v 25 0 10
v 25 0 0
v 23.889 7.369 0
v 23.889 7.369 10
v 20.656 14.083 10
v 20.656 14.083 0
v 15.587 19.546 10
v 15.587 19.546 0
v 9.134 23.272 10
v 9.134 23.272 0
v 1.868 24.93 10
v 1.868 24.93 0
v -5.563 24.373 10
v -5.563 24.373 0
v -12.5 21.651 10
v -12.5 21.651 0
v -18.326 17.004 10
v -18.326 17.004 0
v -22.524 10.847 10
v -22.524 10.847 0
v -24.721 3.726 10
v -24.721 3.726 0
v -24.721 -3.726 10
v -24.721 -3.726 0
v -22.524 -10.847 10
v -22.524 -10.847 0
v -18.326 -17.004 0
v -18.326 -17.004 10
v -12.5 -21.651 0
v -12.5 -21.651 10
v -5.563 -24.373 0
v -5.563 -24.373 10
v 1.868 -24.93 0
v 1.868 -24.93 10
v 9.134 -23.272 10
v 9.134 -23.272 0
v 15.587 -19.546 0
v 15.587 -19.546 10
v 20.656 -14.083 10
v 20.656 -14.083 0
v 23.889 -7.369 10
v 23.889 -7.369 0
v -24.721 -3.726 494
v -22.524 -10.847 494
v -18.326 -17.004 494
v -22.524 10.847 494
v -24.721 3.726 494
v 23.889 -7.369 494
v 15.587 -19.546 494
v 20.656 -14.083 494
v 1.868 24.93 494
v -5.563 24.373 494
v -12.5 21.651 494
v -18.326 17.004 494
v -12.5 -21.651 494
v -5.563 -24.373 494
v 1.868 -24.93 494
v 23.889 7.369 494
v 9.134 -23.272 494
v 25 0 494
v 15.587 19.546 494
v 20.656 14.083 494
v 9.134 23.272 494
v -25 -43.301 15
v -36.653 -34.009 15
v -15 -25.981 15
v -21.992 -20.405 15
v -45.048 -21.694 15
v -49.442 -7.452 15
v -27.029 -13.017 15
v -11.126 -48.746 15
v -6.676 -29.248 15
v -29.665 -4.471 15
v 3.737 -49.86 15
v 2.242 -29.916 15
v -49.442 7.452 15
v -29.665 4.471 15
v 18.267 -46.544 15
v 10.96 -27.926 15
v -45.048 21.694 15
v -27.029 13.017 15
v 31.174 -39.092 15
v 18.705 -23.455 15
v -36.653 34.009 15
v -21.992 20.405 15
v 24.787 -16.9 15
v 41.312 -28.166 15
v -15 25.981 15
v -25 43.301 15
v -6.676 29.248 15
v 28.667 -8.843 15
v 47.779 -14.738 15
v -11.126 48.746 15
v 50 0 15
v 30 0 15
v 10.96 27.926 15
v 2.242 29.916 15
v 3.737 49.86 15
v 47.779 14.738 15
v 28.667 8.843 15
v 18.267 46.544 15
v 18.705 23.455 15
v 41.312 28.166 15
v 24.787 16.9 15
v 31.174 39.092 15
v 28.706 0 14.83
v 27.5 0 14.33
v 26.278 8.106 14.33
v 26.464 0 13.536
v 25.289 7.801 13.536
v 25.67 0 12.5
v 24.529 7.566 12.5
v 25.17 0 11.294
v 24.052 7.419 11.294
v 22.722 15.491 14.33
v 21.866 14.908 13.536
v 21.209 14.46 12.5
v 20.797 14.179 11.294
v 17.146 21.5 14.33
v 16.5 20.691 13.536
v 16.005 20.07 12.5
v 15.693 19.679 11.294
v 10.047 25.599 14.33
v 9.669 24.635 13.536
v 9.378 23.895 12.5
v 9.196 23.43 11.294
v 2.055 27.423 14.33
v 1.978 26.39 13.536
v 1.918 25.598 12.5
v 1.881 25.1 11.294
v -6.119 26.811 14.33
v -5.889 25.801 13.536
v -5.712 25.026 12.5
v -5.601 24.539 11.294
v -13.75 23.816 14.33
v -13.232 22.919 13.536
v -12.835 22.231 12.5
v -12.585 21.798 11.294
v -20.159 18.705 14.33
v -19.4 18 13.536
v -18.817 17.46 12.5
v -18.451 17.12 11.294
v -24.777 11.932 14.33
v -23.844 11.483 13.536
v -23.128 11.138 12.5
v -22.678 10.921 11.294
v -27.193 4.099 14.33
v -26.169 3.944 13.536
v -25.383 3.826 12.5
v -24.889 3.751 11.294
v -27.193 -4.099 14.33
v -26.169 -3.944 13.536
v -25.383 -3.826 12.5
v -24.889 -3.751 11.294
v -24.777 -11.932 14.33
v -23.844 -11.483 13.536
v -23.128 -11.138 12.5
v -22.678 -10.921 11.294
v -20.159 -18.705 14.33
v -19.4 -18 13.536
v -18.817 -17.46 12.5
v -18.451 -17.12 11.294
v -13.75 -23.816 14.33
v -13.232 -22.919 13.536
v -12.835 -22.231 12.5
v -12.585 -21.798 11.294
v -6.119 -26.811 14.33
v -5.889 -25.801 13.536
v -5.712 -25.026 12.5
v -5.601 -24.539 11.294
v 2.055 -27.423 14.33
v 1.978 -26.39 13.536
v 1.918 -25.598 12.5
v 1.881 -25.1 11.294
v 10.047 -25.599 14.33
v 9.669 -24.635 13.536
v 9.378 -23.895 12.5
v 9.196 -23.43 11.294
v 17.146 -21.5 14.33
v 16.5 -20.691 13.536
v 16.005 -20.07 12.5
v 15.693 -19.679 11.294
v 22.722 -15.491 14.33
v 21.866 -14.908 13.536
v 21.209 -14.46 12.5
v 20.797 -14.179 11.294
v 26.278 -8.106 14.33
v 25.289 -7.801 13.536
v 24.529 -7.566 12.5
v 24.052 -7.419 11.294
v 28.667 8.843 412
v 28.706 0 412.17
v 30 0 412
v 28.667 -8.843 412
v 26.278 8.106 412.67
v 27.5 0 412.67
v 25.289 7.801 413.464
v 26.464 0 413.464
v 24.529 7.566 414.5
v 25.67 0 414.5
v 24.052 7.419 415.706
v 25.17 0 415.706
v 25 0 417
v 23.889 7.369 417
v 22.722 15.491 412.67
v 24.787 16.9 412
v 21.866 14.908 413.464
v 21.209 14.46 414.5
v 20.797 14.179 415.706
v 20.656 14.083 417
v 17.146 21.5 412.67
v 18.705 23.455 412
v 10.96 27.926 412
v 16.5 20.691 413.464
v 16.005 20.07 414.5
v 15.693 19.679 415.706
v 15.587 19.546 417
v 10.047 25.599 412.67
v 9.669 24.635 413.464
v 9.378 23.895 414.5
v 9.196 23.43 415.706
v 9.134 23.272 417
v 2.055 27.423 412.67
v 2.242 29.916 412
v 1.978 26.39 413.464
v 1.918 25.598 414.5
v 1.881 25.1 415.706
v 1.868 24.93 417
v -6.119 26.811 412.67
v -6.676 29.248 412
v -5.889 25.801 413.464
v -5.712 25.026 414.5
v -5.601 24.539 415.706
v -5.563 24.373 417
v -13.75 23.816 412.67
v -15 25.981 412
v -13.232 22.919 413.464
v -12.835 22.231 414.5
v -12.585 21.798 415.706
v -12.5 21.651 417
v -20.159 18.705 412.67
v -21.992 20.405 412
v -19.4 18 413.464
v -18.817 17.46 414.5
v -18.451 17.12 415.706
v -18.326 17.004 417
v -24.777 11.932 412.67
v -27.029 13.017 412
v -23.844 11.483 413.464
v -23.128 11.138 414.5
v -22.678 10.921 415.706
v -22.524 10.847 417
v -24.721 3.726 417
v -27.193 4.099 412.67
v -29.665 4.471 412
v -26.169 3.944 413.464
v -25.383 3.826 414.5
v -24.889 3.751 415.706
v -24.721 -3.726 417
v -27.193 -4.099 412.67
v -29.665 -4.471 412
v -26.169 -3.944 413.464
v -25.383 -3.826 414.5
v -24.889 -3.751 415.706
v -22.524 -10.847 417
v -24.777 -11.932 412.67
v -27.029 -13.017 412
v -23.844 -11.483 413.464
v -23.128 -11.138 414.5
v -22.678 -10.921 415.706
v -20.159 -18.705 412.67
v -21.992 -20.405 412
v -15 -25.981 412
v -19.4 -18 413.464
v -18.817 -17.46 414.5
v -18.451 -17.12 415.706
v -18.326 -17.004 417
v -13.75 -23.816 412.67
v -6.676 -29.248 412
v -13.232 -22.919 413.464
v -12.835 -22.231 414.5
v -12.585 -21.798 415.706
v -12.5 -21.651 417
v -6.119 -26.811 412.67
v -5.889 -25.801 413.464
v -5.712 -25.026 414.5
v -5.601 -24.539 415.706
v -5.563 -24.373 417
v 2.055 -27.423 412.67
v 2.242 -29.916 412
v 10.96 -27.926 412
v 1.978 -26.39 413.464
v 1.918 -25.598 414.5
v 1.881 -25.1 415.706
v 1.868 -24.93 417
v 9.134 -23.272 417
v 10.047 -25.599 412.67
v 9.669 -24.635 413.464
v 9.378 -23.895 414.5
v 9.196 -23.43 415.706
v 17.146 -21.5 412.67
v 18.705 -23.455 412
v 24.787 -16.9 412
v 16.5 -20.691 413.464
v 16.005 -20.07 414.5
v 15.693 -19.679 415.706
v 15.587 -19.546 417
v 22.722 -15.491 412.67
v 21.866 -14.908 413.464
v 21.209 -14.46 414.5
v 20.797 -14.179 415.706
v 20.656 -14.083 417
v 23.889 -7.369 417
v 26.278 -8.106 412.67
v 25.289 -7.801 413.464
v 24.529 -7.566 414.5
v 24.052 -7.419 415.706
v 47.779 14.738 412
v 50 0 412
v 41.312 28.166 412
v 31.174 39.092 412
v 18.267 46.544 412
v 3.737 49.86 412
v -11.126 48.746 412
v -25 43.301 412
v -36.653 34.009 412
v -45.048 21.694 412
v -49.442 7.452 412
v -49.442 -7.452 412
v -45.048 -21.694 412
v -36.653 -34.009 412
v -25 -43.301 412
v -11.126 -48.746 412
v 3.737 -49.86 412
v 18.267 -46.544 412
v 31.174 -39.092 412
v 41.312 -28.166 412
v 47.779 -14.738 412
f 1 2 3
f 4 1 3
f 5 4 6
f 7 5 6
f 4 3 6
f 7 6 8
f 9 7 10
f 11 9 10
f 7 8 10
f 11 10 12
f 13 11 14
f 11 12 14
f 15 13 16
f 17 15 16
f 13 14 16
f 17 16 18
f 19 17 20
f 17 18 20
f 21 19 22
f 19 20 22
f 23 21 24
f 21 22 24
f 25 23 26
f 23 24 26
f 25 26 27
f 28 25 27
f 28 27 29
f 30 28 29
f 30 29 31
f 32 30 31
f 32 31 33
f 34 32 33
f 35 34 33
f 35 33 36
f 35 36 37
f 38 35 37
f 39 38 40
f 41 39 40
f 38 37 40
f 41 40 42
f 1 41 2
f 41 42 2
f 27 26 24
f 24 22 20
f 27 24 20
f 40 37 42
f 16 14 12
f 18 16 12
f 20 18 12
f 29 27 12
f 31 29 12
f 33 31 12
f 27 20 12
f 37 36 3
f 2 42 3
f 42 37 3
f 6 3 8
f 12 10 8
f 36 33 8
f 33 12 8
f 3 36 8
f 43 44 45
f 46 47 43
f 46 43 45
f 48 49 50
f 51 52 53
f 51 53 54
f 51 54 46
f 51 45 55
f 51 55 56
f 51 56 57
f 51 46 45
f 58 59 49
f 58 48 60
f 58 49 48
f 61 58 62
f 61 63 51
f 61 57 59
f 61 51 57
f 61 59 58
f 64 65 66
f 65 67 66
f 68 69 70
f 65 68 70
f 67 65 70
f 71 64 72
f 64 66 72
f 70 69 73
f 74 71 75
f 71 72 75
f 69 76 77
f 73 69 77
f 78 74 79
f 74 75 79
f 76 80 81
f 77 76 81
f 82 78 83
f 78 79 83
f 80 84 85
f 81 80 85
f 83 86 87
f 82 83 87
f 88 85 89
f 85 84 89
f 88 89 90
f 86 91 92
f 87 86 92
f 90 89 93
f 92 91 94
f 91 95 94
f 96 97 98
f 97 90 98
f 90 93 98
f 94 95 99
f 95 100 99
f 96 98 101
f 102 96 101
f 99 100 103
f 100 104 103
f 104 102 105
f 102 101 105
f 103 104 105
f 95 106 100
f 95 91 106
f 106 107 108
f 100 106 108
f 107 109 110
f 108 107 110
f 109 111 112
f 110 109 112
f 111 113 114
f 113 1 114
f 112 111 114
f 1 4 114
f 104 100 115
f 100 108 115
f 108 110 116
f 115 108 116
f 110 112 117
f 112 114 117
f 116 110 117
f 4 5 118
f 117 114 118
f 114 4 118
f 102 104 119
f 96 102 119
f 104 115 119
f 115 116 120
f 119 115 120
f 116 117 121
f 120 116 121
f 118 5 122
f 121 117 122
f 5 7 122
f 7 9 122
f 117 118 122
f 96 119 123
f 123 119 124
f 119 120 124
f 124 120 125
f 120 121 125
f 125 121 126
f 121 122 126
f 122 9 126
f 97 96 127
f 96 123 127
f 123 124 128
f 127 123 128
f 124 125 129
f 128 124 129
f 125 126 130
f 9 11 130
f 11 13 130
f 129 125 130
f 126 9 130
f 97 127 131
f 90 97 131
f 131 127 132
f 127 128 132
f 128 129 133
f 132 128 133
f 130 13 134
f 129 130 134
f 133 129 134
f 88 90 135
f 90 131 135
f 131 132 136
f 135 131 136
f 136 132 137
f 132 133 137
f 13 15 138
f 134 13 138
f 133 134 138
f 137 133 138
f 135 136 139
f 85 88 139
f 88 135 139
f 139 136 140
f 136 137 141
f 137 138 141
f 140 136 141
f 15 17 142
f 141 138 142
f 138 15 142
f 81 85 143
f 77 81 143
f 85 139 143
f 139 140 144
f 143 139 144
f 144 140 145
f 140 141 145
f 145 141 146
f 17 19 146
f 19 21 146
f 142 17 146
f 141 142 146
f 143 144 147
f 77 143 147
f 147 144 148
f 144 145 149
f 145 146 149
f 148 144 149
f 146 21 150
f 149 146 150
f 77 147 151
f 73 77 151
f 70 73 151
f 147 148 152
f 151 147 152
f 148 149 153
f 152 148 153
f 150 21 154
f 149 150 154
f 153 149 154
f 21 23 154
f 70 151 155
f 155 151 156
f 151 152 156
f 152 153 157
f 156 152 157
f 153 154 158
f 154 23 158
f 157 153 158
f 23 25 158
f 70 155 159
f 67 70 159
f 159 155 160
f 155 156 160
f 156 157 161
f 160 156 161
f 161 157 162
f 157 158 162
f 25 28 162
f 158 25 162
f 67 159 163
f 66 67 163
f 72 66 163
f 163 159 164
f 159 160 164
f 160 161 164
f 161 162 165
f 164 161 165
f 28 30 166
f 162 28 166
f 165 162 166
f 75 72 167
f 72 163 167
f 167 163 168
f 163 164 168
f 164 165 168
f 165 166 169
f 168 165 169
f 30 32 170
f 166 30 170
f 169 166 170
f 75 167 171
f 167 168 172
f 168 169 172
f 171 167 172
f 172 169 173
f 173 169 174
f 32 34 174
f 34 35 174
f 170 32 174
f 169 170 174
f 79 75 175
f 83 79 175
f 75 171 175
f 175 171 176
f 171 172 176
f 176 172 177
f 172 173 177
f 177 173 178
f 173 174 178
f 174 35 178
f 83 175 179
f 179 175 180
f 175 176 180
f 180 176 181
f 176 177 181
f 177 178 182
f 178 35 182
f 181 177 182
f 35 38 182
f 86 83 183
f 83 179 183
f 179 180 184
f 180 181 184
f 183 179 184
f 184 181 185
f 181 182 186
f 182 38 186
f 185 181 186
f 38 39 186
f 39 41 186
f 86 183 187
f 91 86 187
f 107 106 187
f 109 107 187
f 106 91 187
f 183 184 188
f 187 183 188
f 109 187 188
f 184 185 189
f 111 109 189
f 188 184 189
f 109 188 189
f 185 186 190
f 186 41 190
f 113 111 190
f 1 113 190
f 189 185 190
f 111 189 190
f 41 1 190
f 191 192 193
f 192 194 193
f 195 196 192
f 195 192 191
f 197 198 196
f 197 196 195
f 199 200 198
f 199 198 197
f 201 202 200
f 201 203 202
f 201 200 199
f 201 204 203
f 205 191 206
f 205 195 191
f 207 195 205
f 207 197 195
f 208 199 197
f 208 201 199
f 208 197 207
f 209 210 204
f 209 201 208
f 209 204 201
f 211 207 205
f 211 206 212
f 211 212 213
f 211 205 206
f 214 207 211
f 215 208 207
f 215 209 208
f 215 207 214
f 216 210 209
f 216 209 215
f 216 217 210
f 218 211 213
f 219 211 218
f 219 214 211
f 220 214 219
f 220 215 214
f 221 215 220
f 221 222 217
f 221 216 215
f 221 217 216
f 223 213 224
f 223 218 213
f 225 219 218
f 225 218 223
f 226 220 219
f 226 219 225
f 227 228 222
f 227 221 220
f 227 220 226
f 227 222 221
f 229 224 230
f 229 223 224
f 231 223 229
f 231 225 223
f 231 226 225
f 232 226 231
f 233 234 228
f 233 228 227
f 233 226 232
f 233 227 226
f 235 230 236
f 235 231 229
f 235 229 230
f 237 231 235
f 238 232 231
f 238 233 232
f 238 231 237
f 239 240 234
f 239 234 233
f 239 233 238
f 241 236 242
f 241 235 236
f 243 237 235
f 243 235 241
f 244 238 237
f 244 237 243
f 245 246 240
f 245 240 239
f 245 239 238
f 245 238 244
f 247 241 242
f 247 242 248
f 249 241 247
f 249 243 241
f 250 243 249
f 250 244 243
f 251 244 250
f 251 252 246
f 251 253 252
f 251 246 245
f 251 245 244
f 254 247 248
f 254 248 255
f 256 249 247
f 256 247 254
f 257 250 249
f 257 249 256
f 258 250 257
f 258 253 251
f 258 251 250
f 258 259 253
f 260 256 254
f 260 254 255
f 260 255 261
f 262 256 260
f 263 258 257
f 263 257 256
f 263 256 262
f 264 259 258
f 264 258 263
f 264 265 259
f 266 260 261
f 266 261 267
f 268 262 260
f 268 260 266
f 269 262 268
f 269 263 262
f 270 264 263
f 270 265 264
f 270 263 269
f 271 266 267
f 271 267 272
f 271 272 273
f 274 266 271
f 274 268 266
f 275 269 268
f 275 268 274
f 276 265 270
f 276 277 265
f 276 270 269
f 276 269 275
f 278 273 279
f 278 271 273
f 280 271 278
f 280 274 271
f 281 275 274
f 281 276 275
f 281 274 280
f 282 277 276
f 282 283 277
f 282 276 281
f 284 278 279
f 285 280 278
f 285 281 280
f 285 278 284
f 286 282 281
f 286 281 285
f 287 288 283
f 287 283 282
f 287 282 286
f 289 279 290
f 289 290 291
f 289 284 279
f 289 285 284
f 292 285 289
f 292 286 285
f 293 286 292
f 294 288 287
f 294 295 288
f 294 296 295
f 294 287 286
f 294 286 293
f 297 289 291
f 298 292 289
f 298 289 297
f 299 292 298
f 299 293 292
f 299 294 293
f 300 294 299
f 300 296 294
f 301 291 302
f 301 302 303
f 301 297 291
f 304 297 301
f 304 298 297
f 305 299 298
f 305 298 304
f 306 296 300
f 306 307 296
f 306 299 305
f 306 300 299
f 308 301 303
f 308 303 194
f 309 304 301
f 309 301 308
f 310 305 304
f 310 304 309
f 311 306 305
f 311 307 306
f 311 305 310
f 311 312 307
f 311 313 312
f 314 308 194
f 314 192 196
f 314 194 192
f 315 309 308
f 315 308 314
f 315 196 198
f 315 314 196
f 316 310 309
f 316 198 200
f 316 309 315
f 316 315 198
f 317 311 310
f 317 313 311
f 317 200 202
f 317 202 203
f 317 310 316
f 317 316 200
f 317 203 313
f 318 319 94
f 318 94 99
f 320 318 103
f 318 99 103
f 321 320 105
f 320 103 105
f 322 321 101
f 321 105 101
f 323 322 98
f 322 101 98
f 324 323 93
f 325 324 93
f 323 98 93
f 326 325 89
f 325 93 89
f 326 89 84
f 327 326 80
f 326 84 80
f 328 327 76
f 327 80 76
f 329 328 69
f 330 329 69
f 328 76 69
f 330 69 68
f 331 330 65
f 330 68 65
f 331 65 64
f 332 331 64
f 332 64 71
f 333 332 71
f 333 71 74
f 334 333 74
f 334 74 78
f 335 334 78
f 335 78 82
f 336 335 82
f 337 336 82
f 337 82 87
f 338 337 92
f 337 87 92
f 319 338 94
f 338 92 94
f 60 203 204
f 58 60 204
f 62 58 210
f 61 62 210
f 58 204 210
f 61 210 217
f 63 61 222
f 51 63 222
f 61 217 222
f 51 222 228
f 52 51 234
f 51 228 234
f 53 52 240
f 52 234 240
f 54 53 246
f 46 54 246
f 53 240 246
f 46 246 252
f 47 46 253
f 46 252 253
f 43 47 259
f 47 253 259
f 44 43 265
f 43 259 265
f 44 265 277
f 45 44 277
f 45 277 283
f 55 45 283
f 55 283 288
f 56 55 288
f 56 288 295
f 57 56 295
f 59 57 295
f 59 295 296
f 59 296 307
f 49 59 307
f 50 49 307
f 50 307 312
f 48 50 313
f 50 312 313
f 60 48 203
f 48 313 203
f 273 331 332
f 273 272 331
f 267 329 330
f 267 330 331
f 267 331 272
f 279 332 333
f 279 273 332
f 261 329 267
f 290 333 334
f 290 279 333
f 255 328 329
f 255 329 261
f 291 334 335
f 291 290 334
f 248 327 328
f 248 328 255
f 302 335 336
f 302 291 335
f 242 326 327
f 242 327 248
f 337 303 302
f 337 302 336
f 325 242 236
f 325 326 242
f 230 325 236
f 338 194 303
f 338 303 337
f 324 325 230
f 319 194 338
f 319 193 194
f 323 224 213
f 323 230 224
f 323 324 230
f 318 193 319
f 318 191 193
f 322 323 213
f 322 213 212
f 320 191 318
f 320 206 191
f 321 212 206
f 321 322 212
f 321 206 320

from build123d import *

# Parameters (mm, degrees)
SKETCH1_R           = 25
BOSS_EXTRUDE1_DEPTH = 15
SKETCH2_R           = 50
BOSS_EXTRUDE2_DEPTH = 397
SKETCH3_R           = 25
BOSS_EXTRUDE3_DEPTH = 82
FILLET1_R           = 5


with BuildPart() as part:
    # Sketch1 → Boss-Extrude1 (new body)
    with BuildSketch(Plane.XY):
        Circle(SKETCH1_R)
    extrude(amount=BOSS_EXTRUDE1_DEPTH)

    # Sketch2 → Boss-Extrude2 (add)
    with BuildSketch(Plane.XY.offset(15)):
        Circle(SKETCH2_R)
    extrude(amount=BOSS_EXTRUDE2_DEPTH)

    # Sketch3 → Boss-Extrude3 (add)
    with BuildSketch(Plane.XY.offset(412)):
        Circle(SKETCH3_R)
    extrude(amount=BOSS_EXTRUDE3_DEPTH)

    # Fillet1
    fillet1_edges = [part.edges().sort_by_distance(p)[0] for p in [
        (-25, 0, 15),
        (-25, 0, 412),
    ]]
    fillet(fillet1_edges, radius=FILLET1_R)


solid = part.part
